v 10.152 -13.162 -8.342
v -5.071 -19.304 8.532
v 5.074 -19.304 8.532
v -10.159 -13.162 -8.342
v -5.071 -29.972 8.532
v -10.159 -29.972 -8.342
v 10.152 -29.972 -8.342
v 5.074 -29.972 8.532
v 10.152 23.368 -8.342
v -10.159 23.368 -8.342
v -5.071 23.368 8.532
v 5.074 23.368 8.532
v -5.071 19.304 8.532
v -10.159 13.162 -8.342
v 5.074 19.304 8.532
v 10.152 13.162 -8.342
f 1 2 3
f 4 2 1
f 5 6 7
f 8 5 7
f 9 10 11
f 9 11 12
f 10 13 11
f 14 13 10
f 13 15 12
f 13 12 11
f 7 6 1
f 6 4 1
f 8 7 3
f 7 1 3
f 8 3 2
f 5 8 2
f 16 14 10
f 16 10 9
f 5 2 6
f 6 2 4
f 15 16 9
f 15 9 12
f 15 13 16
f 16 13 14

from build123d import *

# Parameters (mm, degrees)
F1_DEPTH    = 23.368
F2_T1_DEPTH = 285.3238303429
F4_DEPTH    = 6.604


# Not quite as in the source:
# - a fillet or chamfer that OpenCascade refuses, or shapes differently, is made with other operations: its cross-section is extruded or revolved along the edge and cut away or added


with BuildPart() as f1:
    # F0 (on Front) → F1 (new body)
    with BuildSketch(Plane.XZ):
        Polygon((0, -8.3422744647), (0, 0), (0, 8.5318721831), (-5.0714211538, 8.5318721831), (-10.1590277627, -8.3422744647), align=None)
        Polygon((0, 8.5318721831), (0, 0), (0, -8.3422744647), (10.1518854499, -8.3422744647), (5.0742193125, 8.5318721831), align=None)
    extrude(amount=F1_DEPTH)

    # F2: chamfer of 19.304 x 53.0373041052 on 1 edges, made by hand

    # F2_s2 → F2_t1 (cut)
    with BuildSketch(Plane.YZ.offset(-142.6605160921)):
        Polygon((-19.304, 8.5318721831), (0, -44.5054319221), (0, 8.5318721831), align=None)
    extrude(amount=F2_T1_DEPTH, mode=Mode.SUBTRACT)


with BuildPart() as f3_1:
    # F3: instance of F1
    add(f1.part.mirror(Plane.XZ))


with BuildPart() as f1_1:
    add(f1.part)

    # F4 (add): a face of the model
    f4_faces = [f1_1.faces().sort_by_distance(p)[0] for p in [
        (-0.0013625187, -23.368, -0.8438622953),
    ]]
    extrude(f4_faces, amount=F4_DEPTH)


solid = Compound([f3_1.part, f1_1.part])
